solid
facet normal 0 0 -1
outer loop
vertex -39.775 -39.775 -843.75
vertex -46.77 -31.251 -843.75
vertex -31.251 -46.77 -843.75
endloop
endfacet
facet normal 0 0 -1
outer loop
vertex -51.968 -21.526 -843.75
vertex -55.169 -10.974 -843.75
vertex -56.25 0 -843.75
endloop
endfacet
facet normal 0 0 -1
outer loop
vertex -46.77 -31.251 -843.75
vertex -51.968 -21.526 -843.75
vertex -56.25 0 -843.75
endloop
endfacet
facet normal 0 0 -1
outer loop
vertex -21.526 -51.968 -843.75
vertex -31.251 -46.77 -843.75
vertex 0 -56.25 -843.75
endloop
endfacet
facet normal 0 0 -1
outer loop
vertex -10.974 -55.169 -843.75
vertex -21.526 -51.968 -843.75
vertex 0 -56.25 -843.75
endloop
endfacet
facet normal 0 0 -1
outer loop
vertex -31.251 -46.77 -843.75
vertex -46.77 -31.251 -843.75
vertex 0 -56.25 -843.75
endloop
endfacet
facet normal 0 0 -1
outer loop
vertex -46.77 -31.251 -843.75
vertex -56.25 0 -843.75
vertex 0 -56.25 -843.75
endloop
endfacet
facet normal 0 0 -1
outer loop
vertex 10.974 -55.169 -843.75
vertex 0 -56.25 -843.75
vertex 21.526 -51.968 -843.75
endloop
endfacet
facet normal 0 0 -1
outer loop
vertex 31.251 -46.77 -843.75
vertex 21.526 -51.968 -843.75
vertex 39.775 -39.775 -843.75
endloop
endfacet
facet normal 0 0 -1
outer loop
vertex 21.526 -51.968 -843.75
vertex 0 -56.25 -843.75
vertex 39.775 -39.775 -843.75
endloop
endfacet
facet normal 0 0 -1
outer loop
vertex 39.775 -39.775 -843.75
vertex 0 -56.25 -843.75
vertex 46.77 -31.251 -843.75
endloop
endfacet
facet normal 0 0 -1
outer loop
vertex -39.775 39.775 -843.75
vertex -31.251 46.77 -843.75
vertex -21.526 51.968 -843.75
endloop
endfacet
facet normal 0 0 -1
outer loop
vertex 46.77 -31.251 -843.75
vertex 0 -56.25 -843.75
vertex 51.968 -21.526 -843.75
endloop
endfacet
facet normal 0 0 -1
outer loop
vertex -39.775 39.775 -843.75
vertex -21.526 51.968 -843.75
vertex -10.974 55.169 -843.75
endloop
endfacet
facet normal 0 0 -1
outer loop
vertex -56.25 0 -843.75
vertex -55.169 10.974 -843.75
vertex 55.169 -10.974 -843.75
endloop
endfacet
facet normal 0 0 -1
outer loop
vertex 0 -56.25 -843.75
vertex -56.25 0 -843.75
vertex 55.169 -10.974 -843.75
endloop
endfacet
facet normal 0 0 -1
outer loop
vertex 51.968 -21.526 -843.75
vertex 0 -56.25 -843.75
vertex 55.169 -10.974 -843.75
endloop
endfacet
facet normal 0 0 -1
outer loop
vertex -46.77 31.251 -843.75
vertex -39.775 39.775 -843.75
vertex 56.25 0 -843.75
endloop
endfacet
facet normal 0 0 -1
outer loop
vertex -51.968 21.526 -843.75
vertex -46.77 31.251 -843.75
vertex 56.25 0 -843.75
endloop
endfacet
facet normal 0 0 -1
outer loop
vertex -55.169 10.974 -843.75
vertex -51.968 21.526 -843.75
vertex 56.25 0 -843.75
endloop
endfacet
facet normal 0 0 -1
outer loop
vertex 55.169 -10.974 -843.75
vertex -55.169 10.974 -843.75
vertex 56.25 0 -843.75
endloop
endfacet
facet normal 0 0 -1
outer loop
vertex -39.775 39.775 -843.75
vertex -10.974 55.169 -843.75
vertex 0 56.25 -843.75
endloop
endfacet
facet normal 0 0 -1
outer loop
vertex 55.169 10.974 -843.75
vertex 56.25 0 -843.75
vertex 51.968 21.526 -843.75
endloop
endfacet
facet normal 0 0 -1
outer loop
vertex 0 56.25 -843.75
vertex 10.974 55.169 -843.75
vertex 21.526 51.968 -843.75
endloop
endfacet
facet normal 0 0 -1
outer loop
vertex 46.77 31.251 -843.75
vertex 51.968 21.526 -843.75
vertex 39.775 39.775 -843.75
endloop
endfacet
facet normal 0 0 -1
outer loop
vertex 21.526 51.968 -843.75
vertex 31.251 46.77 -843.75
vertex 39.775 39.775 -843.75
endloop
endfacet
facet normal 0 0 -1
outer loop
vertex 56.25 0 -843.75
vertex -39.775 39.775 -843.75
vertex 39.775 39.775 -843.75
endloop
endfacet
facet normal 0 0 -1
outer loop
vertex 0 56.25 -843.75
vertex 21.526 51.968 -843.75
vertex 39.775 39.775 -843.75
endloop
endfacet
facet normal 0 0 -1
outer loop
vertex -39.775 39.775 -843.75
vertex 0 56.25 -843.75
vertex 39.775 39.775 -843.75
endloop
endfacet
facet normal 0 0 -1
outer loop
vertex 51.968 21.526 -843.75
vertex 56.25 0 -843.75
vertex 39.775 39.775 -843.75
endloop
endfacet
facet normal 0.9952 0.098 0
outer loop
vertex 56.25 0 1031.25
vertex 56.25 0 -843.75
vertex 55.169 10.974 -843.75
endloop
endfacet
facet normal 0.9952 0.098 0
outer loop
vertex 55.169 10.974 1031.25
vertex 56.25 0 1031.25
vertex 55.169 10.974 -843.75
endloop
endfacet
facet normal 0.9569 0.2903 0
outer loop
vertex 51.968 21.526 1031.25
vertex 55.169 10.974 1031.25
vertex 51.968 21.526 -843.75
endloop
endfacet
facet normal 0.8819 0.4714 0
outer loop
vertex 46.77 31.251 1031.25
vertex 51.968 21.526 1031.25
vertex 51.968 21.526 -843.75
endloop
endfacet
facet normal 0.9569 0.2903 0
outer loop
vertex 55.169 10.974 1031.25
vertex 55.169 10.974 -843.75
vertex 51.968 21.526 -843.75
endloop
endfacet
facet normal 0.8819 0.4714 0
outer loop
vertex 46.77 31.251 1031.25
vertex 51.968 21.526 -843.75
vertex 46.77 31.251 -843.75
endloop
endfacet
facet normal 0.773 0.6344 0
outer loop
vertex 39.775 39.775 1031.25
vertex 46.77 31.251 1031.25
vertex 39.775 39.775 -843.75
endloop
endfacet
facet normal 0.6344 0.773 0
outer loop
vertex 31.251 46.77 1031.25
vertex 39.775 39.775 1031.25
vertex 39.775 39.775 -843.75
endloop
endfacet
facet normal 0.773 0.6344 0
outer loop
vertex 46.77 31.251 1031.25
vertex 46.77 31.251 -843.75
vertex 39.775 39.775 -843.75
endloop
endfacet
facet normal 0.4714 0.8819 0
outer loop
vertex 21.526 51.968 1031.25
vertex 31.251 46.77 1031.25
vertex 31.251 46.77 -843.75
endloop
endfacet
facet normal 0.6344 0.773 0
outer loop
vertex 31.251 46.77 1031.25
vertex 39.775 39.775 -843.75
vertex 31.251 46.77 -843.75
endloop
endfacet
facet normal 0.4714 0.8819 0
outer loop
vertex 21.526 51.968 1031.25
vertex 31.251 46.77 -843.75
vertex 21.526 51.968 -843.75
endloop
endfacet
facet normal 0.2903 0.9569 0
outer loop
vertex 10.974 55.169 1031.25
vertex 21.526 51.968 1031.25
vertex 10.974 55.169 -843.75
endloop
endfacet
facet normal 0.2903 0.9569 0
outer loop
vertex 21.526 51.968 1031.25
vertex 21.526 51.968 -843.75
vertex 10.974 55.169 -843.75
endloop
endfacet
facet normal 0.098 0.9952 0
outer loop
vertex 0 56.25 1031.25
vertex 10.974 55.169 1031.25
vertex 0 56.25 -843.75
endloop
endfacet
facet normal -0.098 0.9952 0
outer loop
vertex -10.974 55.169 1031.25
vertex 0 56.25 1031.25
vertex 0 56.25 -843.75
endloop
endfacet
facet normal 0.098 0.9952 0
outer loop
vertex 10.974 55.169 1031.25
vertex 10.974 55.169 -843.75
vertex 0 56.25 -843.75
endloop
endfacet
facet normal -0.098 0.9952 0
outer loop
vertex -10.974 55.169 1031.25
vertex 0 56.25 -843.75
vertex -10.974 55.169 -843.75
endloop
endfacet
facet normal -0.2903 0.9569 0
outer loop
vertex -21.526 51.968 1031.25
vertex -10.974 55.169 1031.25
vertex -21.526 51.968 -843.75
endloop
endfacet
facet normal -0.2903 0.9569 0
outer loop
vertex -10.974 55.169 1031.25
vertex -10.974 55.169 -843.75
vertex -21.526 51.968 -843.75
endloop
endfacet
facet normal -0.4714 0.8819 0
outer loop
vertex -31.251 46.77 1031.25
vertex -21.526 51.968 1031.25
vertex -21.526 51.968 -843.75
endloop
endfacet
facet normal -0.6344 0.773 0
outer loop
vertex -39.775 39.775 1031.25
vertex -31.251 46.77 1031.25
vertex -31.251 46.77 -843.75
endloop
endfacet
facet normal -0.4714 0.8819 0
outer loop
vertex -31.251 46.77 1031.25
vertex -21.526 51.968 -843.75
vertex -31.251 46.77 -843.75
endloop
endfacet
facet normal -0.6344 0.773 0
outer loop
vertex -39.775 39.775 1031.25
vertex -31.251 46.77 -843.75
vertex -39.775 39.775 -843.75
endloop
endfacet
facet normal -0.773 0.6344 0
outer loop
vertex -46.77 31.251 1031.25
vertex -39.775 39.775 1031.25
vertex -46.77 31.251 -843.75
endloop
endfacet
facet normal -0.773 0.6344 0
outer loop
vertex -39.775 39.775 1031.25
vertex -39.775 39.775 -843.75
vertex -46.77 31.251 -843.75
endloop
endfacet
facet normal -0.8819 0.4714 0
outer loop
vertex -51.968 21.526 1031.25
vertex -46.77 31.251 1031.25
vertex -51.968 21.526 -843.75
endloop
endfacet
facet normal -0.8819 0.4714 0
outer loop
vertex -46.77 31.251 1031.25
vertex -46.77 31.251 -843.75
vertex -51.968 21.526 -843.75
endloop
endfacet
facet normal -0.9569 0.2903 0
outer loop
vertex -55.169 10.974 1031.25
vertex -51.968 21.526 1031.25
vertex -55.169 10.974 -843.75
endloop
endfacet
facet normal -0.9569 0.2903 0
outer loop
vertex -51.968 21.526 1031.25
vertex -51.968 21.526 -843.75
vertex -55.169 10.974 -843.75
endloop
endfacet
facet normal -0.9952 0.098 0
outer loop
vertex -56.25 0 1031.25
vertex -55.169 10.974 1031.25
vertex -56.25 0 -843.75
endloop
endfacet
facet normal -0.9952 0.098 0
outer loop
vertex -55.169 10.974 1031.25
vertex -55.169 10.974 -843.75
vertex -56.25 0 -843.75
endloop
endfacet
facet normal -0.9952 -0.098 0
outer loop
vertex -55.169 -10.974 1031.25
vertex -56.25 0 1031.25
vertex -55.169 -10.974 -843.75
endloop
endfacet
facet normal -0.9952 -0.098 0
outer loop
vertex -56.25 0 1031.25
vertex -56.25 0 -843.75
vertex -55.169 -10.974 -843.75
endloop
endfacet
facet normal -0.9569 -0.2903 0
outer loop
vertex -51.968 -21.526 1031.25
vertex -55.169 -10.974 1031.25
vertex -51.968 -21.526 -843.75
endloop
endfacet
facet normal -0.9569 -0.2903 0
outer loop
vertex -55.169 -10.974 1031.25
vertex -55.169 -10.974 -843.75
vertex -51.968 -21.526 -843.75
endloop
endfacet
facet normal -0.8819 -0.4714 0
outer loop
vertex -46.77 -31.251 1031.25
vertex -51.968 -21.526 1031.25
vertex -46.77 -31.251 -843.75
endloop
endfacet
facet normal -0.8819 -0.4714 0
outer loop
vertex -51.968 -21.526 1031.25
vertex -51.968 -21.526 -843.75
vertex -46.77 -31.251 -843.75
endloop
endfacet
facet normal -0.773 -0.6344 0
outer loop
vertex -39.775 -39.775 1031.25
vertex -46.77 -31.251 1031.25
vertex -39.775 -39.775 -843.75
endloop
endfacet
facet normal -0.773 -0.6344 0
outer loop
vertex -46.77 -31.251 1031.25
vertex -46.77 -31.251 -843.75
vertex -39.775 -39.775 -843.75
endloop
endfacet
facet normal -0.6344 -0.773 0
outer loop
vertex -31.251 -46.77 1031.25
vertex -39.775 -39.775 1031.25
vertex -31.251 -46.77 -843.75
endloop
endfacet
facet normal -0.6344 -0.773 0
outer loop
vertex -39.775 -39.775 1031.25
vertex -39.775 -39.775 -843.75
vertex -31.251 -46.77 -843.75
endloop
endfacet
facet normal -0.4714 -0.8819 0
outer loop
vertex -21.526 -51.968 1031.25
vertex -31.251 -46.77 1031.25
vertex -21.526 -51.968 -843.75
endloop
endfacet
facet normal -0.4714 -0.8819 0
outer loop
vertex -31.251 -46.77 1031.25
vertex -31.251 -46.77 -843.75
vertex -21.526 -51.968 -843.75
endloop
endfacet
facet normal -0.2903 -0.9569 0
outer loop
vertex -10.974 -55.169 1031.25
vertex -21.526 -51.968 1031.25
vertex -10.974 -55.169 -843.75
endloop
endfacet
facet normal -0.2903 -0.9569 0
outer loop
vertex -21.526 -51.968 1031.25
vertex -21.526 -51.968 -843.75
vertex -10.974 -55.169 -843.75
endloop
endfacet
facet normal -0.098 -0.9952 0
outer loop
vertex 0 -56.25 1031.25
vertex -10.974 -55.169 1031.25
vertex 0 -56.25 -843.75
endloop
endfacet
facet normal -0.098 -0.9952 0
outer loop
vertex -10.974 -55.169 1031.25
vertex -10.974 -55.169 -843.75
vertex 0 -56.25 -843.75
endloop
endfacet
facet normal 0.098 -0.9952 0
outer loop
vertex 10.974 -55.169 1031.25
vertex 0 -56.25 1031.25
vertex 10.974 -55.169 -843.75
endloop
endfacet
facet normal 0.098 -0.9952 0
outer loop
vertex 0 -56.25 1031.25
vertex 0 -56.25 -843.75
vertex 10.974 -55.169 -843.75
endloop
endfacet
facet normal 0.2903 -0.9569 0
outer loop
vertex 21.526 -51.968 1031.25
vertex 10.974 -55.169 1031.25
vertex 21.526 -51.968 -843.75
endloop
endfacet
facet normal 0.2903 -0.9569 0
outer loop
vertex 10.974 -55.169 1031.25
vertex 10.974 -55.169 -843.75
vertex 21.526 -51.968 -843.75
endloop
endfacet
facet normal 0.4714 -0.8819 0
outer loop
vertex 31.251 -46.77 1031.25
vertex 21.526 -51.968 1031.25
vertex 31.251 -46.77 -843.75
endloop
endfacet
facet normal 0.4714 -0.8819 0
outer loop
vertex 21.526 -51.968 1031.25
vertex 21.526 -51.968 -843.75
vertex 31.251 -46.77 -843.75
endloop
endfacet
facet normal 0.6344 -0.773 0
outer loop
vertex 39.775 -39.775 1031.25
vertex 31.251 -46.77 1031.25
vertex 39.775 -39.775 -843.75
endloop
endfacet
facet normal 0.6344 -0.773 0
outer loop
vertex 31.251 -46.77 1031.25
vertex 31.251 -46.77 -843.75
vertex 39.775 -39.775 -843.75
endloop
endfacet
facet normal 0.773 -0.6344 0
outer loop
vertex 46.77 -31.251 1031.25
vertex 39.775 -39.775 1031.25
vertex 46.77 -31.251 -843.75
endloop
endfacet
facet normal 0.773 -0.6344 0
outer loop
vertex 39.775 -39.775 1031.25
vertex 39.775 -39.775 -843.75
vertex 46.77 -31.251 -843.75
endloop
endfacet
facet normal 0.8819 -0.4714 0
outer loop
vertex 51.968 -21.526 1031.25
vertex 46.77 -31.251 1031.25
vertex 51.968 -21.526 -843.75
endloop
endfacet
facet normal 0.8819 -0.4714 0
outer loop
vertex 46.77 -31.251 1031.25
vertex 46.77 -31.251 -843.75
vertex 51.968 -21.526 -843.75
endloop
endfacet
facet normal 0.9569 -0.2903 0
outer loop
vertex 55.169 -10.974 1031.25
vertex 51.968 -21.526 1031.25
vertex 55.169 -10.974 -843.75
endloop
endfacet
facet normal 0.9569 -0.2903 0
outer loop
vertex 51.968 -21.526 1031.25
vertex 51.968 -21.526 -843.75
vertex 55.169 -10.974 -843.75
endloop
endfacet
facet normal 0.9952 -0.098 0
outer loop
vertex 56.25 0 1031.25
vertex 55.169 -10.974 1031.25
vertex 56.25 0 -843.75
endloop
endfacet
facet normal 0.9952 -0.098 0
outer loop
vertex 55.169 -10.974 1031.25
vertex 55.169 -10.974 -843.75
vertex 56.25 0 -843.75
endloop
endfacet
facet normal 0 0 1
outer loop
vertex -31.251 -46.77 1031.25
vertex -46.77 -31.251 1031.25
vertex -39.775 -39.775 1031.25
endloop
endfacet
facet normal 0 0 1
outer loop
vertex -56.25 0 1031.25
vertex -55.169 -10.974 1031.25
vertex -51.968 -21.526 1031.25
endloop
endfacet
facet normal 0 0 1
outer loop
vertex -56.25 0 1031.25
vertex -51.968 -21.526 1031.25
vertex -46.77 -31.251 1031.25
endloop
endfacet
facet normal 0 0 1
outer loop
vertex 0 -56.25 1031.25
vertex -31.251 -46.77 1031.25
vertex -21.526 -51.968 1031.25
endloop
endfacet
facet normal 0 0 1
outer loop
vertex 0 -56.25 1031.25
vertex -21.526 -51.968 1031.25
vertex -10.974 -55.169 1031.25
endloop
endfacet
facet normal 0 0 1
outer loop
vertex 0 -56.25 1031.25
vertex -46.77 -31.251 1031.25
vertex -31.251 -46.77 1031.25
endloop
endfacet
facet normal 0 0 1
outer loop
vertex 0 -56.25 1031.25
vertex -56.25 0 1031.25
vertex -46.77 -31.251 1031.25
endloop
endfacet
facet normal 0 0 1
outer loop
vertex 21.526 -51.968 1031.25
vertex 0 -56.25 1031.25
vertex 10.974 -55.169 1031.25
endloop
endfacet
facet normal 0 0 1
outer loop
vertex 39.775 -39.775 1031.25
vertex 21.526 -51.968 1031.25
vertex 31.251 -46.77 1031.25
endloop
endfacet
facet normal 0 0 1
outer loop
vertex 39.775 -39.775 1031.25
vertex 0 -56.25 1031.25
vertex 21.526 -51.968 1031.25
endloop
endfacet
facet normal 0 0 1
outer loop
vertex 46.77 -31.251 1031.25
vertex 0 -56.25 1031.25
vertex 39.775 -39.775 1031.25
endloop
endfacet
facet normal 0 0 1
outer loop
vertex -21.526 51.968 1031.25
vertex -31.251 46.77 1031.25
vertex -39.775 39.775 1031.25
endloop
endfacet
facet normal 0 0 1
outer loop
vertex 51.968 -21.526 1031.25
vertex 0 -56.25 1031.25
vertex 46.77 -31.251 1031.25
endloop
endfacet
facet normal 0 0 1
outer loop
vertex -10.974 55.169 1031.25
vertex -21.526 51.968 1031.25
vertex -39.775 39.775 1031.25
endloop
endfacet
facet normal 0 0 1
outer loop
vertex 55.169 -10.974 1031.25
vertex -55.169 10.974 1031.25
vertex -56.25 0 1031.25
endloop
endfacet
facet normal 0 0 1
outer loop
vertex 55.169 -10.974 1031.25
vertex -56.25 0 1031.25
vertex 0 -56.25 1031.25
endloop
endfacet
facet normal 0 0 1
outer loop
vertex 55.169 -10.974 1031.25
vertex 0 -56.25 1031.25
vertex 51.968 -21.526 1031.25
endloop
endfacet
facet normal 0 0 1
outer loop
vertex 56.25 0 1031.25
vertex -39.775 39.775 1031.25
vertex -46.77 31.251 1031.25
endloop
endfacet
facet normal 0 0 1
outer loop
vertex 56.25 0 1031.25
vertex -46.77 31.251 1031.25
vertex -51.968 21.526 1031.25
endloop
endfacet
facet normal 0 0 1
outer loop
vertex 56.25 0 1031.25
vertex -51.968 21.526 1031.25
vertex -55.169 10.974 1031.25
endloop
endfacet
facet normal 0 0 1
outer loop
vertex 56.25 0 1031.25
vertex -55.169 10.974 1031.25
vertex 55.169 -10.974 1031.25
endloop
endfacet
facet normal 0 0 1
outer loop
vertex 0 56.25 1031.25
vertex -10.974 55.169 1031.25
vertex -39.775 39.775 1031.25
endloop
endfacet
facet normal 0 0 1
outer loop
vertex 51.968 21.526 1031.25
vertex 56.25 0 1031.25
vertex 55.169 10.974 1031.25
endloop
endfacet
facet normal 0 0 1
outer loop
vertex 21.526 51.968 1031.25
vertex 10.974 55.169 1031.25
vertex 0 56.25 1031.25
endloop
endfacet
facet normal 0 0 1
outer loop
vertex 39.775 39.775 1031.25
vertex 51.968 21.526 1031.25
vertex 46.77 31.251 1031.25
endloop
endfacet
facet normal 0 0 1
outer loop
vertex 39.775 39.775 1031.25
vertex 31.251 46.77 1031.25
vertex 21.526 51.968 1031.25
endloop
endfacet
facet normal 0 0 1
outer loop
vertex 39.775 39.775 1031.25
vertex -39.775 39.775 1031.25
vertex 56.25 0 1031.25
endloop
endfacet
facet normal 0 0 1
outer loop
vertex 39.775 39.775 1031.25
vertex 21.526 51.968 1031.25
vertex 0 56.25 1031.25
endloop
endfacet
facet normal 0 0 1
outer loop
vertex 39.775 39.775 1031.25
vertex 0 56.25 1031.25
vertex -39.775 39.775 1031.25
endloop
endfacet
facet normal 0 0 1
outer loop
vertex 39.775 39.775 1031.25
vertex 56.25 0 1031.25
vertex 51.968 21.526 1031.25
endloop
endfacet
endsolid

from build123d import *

# Parameters (mm, degrees)
SKETCH1_R           = 7.5
BOSS_EXTRUDE1_DEPTH = 250
SCALE1_SCALE        = 10
SCALE2_SCALE        = 0.75


with BuildPart() as part:
    # Sketch1 → Boss-Extrude1 (new body)
    with BuildSketch(Plane.XY):
        Circle(SKETCH1_R)
    extrude(amount=BOSS_EXTRUDE1_DEPTH)


with BuildPart() as part_1:
    # Scale1: scaled about (0, 0, 125)
    add(part.part.scale(SCALE1_SCALE).moved(Location((0, 0, -1125))))


with BuildPart() as part_2:
    # Scale2: scaled about (0, 0, 0)
    add(part_1.part.scale(SCALE2_SCALE))


solid = part_2.part
